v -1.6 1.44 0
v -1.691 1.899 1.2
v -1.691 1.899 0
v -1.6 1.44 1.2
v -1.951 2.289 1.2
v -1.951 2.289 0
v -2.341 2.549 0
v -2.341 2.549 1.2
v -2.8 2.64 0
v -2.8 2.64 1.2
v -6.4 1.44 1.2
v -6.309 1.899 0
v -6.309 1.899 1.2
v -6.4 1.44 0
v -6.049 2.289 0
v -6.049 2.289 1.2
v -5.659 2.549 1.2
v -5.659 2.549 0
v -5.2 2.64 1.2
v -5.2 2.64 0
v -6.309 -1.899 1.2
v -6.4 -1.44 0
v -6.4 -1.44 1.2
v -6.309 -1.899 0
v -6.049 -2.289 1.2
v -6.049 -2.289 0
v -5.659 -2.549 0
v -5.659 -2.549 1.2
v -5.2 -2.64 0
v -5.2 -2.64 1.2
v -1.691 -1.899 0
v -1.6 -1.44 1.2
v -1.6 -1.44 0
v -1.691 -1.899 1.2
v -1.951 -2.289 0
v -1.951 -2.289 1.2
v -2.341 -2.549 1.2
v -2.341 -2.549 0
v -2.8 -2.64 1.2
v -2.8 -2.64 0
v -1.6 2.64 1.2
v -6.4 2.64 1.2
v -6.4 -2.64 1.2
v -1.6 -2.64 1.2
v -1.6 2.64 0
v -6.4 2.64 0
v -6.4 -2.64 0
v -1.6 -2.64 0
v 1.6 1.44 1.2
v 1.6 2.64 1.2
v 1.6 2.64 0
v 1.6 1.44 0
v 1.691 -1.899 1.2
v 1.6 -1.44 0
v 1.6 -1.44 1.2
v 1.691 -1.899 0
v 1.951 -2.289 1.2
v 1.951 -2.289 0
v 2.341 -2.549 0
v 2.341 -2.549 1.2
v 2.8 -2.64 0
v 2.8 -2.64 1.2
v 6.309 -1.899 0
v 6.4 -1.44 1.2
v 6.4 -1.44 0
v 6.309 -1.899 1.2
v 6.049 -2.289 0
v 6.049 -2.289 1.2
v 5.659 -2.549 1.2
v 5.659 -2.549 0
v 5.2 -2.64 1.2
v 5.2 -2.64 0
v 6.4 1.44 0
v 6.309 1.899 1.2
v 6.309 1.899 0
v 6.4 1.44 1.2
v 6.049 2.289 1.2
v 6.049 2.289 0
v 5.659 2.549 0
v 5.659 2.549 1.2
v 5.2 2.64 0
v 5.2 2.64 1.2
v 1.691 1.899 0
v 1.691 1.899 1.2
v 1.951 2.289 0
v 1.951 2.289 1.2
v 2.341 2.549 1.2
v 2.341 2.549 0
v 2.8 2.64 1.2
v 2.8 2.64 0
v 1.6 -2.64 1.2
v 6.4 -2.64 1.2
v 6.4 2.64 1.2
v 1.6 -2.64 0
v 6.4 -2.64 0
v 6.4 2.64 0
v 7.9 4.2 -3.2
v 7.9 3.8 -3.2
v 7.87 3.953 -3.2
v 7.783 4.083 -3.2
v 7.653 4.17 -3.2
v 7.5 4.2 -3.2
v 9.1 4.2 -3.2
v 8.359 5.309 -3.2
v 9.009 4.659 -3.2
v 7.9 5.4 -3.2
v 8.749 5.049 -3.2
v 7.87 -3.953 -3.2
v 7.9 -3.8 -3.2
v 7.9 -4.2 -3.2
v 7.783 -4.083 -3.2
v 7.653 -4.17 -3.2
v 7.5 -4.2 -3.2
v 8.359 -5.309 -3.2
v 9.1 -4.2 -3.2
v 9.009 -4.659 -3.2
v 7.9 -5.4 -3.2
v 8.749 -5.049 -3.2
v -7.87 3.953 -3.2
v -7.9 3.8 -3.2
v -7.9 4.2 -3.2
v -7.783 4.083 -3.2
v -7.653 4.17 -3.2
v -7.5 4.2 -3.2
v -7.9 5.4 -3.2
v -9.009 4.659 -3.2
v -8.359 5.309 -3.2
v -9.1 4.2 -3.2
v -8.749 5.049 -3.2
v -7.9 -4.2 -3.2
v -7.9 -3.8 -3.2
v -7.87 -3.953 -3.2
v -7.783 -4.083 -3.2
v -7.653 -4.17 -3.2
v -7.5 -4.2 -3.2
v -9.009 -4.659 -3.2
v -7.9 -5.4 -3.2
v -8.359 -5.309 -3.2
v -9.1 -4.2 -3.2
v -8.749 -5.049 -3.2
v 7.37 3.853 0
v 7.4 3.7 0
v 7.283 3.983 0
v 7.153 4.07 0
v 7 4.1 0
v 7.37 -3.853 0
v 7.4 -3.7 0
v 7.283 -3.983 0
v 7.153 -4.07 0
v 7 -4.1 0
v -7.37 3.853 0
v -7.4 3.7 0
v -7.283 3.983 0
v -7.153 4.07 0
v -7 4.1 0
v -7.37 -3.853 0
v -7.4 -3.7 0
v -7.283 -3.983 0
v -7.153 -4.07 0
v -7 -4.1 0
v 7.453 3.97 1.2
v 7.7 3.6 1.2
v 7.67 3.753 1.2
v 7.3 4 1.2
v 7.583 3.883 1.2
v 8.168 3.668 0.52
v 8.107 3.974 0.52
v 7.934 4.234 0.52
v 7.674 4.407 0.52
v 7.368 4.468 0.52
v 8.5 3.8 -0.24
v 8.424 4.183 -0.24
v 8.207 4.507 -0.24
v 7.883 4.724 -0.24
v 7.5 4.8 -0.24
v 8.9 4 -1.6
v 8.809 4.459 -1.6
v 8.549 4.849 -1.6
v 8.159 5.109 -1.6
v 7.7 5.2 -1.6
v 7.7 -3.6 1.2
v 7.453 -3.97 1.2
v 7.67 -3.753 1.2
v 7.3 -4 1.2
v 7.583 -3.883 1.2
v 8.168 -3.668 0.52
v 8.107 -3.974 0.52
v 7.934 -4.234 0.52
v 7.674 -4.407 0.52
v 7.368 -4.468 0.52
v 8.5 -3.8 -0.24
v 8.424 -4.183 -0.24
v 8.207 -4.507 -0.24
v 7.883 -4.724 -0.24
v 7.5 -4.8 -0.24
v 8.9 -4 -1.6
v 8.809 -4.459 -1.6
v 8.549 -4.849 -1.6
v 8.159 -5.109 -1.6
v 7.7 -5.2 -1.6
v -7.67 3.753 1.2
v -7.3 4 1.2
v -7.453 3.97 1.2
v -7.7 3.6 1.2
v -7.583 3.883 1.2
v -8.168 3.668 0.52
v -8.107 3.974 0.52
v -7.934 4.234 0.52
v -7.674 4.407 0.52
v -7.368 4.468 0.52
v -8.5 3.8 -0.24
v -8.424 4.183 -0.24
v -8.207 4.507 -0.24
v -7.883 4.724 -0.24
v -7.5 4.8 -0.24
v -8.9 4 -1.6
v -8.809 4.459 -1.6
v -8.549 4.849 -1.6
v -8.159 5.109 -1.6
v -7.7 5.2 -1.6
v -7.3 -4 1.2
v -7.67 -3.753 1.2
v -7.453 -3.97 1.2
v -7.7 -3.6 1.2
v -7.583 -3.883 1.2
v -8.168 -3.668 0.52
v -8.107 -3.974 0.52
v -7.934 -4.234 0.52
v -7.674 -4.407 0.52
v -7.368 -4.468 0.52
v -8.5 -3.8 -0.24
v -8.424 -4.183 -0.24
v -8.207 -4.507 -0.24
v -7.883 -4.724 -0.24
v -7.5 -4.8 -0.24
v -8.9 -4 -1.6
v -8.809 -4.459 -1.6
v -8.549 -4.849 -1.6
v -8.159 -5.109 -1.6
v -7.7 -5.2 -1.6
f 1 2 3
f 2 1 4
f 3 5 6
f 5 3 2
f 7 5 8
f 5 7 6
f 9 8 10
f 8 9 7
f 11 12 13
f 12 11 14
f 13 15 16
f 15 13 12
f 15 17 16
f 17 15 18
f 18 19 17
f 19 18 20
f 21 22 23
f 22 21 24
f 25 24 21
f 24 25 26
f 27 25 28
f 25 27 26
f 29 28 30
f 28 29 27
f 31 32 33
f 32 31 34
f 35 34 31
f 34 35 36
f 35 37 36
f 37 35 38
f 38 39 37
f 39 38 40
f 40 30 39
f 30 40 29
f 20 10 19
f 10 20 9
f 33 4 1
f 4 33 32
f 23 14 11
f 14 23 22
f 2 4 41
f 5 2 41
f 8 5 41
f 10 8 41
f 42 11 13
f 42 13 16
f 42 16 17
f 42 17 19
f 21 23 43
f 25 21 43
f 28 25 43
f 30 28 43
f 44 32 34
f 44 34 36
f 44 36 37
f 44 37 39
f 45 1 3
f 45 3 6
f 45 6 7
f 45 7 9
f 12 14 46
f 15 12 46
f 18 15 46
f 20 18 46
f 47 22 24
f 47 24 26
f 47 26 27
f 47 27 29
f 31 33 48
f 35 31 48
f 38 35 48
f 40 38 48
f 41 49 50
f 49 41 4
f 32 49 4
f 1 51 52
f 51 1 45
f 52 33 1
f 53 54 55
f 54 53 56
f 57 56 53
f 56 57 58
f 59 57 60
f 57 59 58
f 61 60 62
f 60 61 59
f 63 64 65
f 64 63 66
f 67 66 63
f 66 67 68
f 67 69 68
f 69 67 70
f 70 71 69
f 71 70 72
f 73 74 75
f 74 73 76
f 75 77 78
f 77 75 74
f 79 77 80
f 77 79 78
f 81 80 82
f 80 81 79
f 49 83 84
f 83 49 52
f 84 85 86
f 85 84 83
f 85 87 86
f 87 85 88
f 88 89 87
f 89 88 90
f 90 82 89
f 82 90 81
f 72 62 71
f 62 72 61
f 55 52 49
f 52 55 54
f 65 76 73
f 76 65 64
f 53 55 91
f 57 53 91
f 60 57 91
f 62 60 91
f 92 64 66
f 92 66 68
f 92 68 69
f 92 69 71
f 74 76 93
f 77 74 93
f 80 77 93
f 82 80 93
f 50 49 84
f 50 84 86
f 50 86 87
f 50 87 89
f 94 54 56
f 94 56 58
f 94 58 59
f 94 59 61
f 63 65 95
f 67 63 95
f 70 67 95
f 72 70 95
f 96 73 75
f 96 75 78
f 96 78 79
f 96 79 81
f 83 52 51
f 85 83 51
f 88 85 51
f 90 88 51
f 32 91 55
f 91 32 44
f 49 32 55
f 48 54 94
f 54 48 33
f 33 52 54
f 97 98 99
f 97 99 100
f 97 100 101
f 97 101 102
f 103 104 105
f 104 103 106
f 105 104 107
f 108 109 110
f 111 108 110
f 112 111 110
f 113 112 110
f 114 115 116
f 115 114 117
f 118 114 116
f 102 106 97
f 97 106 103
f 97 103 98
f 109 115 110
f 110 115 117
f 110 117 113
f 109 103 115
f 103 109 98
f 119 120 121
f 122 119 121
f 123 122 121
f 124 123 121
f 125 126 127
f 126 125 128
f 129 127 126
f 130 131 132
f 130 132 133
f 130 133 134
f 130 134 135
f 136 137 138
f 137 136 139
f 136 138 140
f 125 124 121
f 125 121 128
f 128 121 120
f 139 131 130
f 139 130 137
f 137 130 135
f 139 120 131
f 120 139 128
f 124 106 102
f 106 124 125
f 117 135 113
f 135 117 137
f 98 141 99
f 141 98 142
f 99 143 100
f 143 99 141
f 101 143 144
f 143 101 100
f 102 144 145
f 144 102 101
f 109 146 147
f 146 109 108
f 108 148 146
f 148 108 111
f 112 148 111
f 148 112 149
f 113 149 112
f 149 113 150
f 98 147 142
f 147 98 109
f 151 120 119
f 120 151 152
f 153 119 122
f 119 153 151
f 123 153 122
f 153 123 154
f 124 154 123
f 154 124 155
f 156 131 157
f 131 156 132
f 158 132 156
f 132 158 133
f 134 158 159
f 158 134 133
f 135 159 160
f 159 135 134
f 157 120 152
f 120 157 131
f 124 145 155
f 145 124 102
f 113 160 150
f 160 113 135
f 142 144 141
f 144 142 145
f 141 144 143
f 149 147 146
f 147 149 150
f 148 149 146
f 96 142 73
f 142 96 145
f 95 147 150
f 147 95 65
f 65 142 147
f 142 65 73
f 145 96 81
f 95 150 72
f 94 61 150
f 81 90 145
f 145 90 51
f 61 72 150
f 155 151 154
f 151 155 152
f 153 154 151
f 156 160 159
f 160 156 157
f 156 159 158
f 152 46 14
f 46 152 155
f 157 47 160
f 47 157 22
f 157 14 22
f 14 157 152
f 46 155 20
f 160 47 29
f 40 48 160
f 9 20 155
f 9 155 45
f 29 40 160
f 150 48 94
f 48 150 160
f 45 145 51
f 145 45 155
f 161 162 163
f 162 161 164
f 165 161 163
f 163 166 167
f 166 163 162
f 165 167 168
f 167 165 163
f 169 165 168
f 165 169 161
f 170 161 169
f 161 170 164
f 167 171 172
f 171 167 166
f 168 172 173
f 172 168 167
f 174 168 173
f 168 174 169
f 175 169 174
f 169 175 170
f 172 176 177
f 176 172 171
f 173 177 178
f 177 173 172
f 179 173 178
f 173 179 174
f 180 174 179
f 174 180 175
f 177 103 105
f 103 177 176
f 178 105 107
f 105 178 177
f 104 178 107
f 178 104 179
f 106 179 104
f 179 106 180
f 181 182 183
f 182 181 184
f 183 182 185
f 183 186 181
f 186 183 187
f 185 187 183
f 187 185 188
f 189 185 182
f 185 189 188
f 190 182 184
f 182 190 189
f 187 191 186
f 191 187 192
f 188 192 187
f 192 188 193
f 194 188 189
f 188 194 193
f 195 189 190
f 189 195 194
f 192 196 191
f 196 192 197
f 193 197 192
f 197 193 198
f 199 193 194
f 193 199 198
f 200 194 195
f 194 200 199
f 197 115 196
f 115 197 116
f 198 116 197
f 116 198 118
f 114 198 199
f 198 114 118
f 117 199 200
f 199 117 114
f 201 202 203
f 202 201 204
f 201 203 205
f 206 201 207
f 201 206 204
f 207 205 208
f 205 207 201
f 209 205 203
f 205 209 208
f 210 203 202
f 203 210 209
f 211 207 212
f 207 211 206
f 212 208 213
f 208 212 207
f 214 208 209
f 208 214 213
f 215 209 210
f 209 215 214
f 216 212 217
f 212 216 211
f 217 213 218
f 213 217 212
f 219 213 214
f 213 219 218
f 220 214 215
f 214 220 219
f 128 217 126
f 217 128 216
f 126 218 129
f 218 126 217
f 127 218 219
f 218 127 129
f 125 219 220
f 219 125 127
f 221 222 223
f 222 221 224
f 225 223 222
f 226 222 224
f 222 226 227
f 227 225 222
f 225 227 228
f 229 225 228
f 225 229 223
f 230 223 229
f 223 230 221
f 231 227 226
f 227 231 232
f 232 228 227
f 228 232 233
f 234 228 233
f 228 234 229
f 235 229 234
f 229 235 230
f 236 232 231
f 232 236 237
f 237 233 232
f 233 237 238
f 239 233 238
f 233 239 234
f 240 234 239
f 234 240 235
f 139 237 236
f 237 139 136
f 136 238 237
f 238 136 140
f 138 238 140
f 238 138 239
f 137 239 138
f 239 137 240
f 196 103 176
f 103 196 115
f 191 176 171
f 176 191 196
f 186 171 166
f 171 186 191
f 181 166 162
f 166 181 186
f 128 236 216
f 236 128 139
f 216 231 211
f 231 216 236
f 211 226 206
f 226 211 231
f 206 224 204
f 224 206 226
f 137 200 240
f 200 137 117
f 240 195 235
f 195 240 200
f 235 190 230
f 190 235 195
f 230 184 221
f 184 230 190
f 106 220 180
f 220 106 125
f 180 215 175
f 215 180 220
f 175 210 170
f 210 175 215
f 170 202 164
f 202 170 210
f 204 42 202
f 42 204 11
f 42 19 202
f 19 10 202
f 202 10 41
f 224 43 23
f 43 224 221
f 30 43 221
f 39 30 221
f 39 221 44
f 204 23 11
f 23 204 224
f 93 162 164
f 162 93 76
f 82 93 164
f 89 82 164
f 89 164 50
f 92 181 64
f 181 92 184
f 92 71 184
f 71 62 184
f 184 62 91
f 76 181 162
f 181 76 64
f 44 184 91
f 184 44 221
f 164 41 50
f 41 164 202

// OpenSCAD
use <../lib.scad>
use <../p/1-4chrd.scad>
use <../p/1-4con1.scad>
use <../p/1-4con4.scad>
use <../p/1-4con5.scad>
use <../p/1-4cyli.scad>
use <../p/1-4cylo.scad>
use <../p/1-4edge.scad>
use <../p/1-4ndis.scad>
use <s/24779s03.scad>
$fa=1; $fs=0.2;
function ldraw_lib__65753(realsolid=false) = [
// 0 Minifig Skirt Straight Curved  0.55 Length
// 0 Name: 65753.dat
// 0 Author: Gerald Lasser [GeraldLasser]
// 0 !LDRAW_ORG Part UPDATE 2022-03
// 0 !LICENSE Licensed under CC BY 2.0 and CC BY 4.0 : see CAreadme.txt
// 
// 0 BFC CERTIFY CCW
  [0,"BFC","CERTIFY"],
  [0,"BFC","CCW"],
// 
// 0 !CATEGORY Minifig Hipwear
// 
// 0 !HISTORY 2022-05-07 [PTadmin] Official Update 2022-03
// 
// 
// 1 16 0 0 0 1 0 0 0 1 0 0 0 1 s\24779s03.dat
  [1,16,0,0,0,1,0,0,0,1,0,0,0,1, ldraw_lib__s__24779s03(realsolid)],
// 1 16 0 0 0 -1 0 0 0 1 0 0 0 -1 s\24779s03.dat
  [1,16,0,0,0,-1,0,0,0,1,0,0,0,-1, ldraw_lib__s__24779s03(realsolid)],
// 
// 0 // Bottom
// 1 16 18.75 8 9.5 1 0 0 0 -1 0 0 0 1 1-4ndis.dat
  [1,16,18.75,8,9.5,1,0,0,0,-1,0,0,0,1, ldraw_lib__1_4ndis(realsolid)],
// 1 16 19.75 8 10.5 3 0 0 0 -1 0 0 0 3 1-4chrd.dat
  [1,16,19.75,8,10.5,3,0,0,0,-1,0,0,0,3, ldraw_lib__1_4chrd(realsolid)],
// 1 16 18.75 8 -9.5 1 0 0 0 -1 0 0 0 -1 1-4ndis.dat
  [1,16,18.75,8,-9.5,1,0,0,0,-1,0,0,0,-1, ldraw_lib__1_4ndis(realsolid)],
// 1 16 19.75 8 -10.5 3 0 0 0 -1 0 0 0 -3 1-4chrd.dat
  [1,16,19.75,8,-10.5,3,0,0,0,-1,0,0,0,-3, ldraw_lib__1_4chrd(realsolid)],
// 3 16 18.75 8 10.5 19.75 8 13.5 19.75 8 10.5
  [3,16,18.75,8,10.5,19.75,8,13.5,19.75,8,10.5],
// 3 16 19.75 8 10.5 19.75 8 13.5 22.75 8 10.5
  [3,16,19.75,8,10.5,19.75,8,13.5,22.75,8,10.5],
// 3 16 19.75 8 10.5 22.75 8 10.5 19.75 8 9.5
  [3,16,19.75,8,10.5,22.75,8,10.5,19.75,8,9.5],
// 3 16 19.75 8 -9.5 22.75 8 -10.5 19.75 8 -10.5
  [3,16,19.75,8,-9.5,22.75,8,-10.5,19.75,8,-10.5],
// 3 16 19.75 8 -10.5 22.75 8 -10.5 19.75 8 -13.5
  [3,16,19.75,8,-10.5,22.75,8,-10.5,19.75,8,-13.5],
// 3 16 19.75 8 -10.5 19.75 8 -13.5 18.75 8 -10.5
  [3,16,19.75,8,-10.5,19.75,8,-13.5,18.75,8,-10.5],
// 4 16 22.75 8 -10.5 19.75 8 -9.5 19.75 8 9.5 22.75 8 10.5
  [4,16,22.75,8,-10.5,19.75,8,-9.5,19.75,8,9.5,22.75,8,10.5],
// 1 16 19.75 8 10.5 3 0 0 0 -1 0 0 0 3 1-4edge.dat
  [1,16,19.75,8,10.5,3,0,0,0,-1,0,0,0,3, ldraw_lib__1_4edge(realsolid)],
// 1 16 19.75 8 -10.5 3 0 0 0 -1 0 0 0 -3 1-4edge.dat
  [1,16,19.75,8,-10.5,3,0,0,0,-1,0,0,0,-3, ldraw_lib__1_4edge(realsolid)],
// 2 24 19.75 8 9.5 19.75 8 -9.5
  [2,24,19.75,8,9.5,19.75,8,-9.5],
// 2 24 22.75 8 10.5 22.75 8 -10.5
  [2,24,22.75,8,10.5,22.75,8,-10.5],
// 1 16 -18.75 8 9.5 -1 0 0 0 -1 0 0 0 1 1-4ndis.dat
  [1,16,-18.75,8,9.5,-1,0,0,0,-1,0,0,0,1, ldraw_lib__1_4ndis(realsolid)],
// 1 16 -19.75 8 10.5 -3 0 0 0 -1 0 0 0 3 1-4chrd.dat
  [1,16,-19.75,8,10.5,-3,0,0,0,-1,0,0,0,3, ldraw_lib__1_4chrd(realsolid)],
// 1 16 -18.75 8 -9.5 -1 0 0 0 -1 0 0 0 -1 1-4ndis.dat
  [1,16,-18.75,8,-9.5,-1,0,0,0,-1,0,0,0,-1, ldraw_lib__1_4ndis(realsolid)],
// 1 16 -19.75 8 -10.5 -3 0 0 0 -1 0 0 0 -3 1-4chrd.dat
  [1,16,-19.75,8,-10.5,-3,0,0,0,-1,0,0,0,-3, ldraw_lib__1_4chrd(realsolid)],
// 3 16 -19.75 8 13.5 -18.75 8 10.5 -19.75 8 10.5
  [3,16,-19.75,8,13.5,-18.75,8,10.5,-19.75,8,10.5],
// 3 16 -19.75 8 13.5 -19.75 8 10.5 -22.75 8 10.5
  [3,16,-19.75,8,13.5,-19.75,8,10.5,-22.75,8,10.5],
// 3 16 -22.75 8 10.5 -19.75 8 10.5 -19.75 8 9.5
  [3,16,-22.75,8,10.5,-19.75,8,10.5,-19.75,8,9.5],
// 3 16 -22.75 8 -10.5 -19.75 8 -9.5 -19.75 8 -10.5
  [3,16,-22.75,8,-10.5,-19.75,8,-9.5,-19.75,8,-10.5],
// 3 16 -22.75 8 -10.5 -19.75 8 -10.5 -19.75 8 -13.5
  [3,16,-22.75,8,-10.5,-19.75,8,-10.5,-19.75,8,-13.5],
// 3 16 -19.75 8 -13.5 -19.75 8 -10.5 -18.75 8 -10.5
  [3,16,-19.75,8,-13.5,-19.75,8,-10.5,-18.75,8,-10.5],
// 4 16 -19.75 8 9.5 -19.75 8 -9.5 -22.75 8 -10.5 -22.75 8 10.5
  [4,16,-19.75,8,9.5,-19.75,8,-9.5,-22.75,8,-10.5,-22.75,8,10.5],
// 1 16 -19.75 8 10.5 -3 0 0 0 -1 0 0 0 3 1-4edge.dat
  [1,16,-19.75,8,10.5,-3,0,0,0,-1,0,0,0,3, ldraw_lib__1_4edge(realsolid)],
// 1 16 -19.75 8 -10.5 -3 0 0 0 -1 0 0 0 -3 1-4edge.dat
  [1,16,-19.75,8,-10.5,-3,0,0,0,-1,0,0,0,-3, ldraw_lib__1_4edge(realsolid)],
// 2 24 -19.75 8 9.5 -19.75 8 -9.5
  [2,24,-19.75,8,9.5,-19.75,8,-9.5],
// 2 24 -22.75 8 10.5 -22.75 8 -10.5
  [2,24,-22.75,8,10.5,-22.75,8,-10.5],
// 
// 4 16 19.75 8 13.5 18.75 8 10.5 -18.75 8 10.5 -19.75 8 13.5
  [4,16,19.75,8,13.5,18.75,8,10.5,-18.75,8,10.5,-19.75,8,13.5],
// 4 16 -18.75 8 -10.5 18.75 8 -10.5 19.75 8 -13.5 -19.75 8 -13.5
  [4,16,-18.75,8,-10.5,18.75,8,-10.5,19.75,8,-13.5,-19.75,8,-13.5],
// 2 24 19.75 8 13.5 -19.75 8 13.5
  [2,24,19.75,8,13.5,-19.75,8,13.5],
// 2 24 -18.75 8 10.5 18.75 8 10.5
  [2,24,-18.75,8,10.5,18.75,8,10.5],
// 2 24 18.75 8 -10.5 -18.75 8 -10.5
  [2,24,18.75,8,-10.5,-18.75,8,-10.5],
// 2 24 -19.75 8 -13.5 19.75 8 -13.5
  [2,24,-19.75,8,-13.5,19.75,8,-13.5],
// 
// 0 // Inside Skirt
// 0 BFC INVERTNEXT
  [0,"BFC","INVERTNEXT"],
// 1 16 17.5 0 9.25 1 1.25 0 0 8 0 0 .25 1 1-4cylo.dat
  [1,16,17.5,0,9.25,1,1.25,0,0,8,0,0,.25,1, ldraw_lib__1_4cylo(realsolid)],
// 0 BFC INVERTNEXT
  [0,"BFC","INVERTNEXT"],
// 1 16 17.5 0 -9.25 1 1.25 0 0 8 0 0 -.25 -1 1-4cylo.dat
  [1,16,17.5,0,-9.25,1,1.25,0,0,8,0,0,-.25,-1, ldraw_lib__1_4cylo(realsolid)],
// 4 16 19.75 8 9.5 19.75 8 -9.5 18.5 0 -9.25 18.5 0 9.25
  [4,16,19.75,8,9.5,19.75,8,-9.5,18.5,0,-9.25,18.5,0,9.25],
// 0 BFC INVERTNEXT
  [0,"BFC","INVERTNEXT"],
// 1 16 -17.5 0 9.25 -1 -1.25 0 0 8 0 0 .25 1 1-4cylo.dat
  [1,16,-17.5,0,9.25,-1,-1.25,0,0,8,0,0,.25,1, ldraw_lib__1_4cylo(realsolid)],
// 0 BFC INVERTNEXT
  [0,"BFC","INVERTNEXT"],
// 1 16 -17.5 0 -9.25 -1 -1.25 0 0 8 0 0 -.25 -1 1-4cylo.dat
  [1,16,-17.5,0,-9.25,-1,-1.25,0,0,8,0,0,-.25,-1, ldraw_lib__1_4cylo(realsolid)],
// 4 16 -18.5 0 -9.25 -19.75 8 -9.5 -19.75 8 9.5 -18.5 0 9.25
  [4,16,-18.5,0,-9.25,-19.75,8,-9.5,-19.75,8,9.5,-18.5,0,9.25],
// 4 16 -18.75 8 10.5 18.75 8 10.5 17.5 0 10.25 -17.5 0 10.25
  [4,16,-18.75,8,10.5,18.75,8,10.5,17.5,0,10.25,-17.5,0,10.25],
// 4 16 18.75 8 -10.5 -18.75 8 -10.5 -17.5 0 -10.25 17.5 0 -10.25
  [4,16,18.75,8,-10.5,-18.75,8,-10.5,-17.5,0,-10.25,17.5,0,-10.25],
// 
// 0 // Inside Top
// 1 16 17.5 0 9.25 1 0 0 0 -1 0 0 0 1 1-4chrd.dat
  [1,16,17.5,0,9.25,1,0,0,0,-1,0,0,0,1, ldraw_lib__1_4chrd(realsolid)],
// 1 16 17.5 0 -9.25 1 0 0 0 -1 0 0 0 -1 1-4chrd.dat
  [1,16,17.5,0,-9.25,1,0,0,0,-1,0,0,0,-1, ldraw_lib__1_4chrd(realsolid)],
// 4 16 16 0 6.6 17.5 0 10.25 18.5 0 9.25 16 0 3.6
  [4,16,16,0,6.6,17.5,0,10.25,18.5,0,9.25,16,0,3.6],
// 4 16 18.5 0 -9.25 17.5 0 -10.25 16 0 -6.6 16 0 -3.6
  [4,16,18.5,0,-9.25,17.5,0,-10.25,16,0,-6.6,16,0,-3.6],
// 4 16 18.5 0 -9.25 16 0 -3.6 16 0 3.6 18.5 0 9.25
  [4,16,18.5,0,-9.25,16,0,-3.6,16,0,3.6,18.5,0,9.25],
// 3 16 17.5 0 10.25 16 0 6.6 13 0 6.6
  [3,16,17.5,0,10.25,16,0,6.6,13,0,6.6],
// 3 16 16 0 -6.6 17.5 0 -10.25 13 0 -6.6
  [3,16,16,0,-6.6,17.5,0,-10.25,13,0,-6.6],
// 3 16 4 0 -6.6 7 0 -6.6 17.5 0 -10.25
  [3,16,4,0,-6.6,7,0,-6.6,17.5,0,-10.25],
// 3 16 13 0 6.6 7 0 6.6 17.5 0 10.25
  [3,16,13,0,6.6,7,0,6.6,17.5,0,10.25],
// 3 16 17.5 0 10.25 7 0 6.6 4 0 6.6
  [3,16,17.5,0,10.25,7,0,6.6,4,0,6.6],
// 3 16 7 0 -6.6 13 0 -6.6 17.5 0 -10.25
  [3,16,7,0,-6.6,13,0,-6.6,17.5,0,-10.25],
// 
// 1 16 -17.5 0 9.25 -1 0 0 0 -1 0 0 0 1 1-4chrd.dat
  [1,16,-17.5,0,9.25,-1,0,0,0,-1,0,0,0,1, ldraw_lib__1_4chrd(realsolid)],
// 1 16 -17.5 0 -9.25 -1 0 0 0 -1 0 0 0 -1 1-4chrd.dat
  [1,16,-17.5,0,-9.25,-1,0,0,0,-1,0,0,0,-1, ldraw_lib__1_4chrd(realsolid)],
// 4 16 -18.5 0 9.25 -17.5 0 10.25 -16 0 6.6 -16 0 3.6
  [4,16,-18.5,0,9.25,-17.5,0,10.25,-16,0,6.6,-16,0,3.6],
// 4 16 -16 0 -6.6 -17.5 0 -10.25 -18.5 0 -9.25 -16 0 -3.6
  [4,16,-16,0,-6.6,-17.5,0,-10.25,-18.5,0,-9.25,-16,0,-3.6],
// 4 16 -16 0 3.6 -16 0 -3.6 -18.5 0 -9.25 -18.5 0 9.25
  [4,16,-16,0,3.6,-16,0,-3.6,-18.5,0,-9.25,-18.5,0,9.25],
// 3 16 -16 0 6.6 -17.5 0 10.25 -13 0 6.6
  [3,16,-16,0,6.6,-17.5,0,10.25,-13,0,6.6],
// 3 16 -17.5 0 -10.25 -16 0 -6.6 -13 0 -6.6
  [3,16,-17.5,0,-10.25,-16,0,-6.6,-13,0,-6.6],
// 3 16 -7 0 -6.6 -4 0 -6.6 -17.5 0 -10.25
  [3,16,-7,0,-6.6,-4,0,-6.6,-17.5,0,-10.25],
// 3 16 -7 0 6.6 -13 0 6.6 -17.5 0 10.25
  [3,16,-7,0,6.6,-13,0,6.6,-17.5,0,10.25],
// 3 16 -7 0 6.6 -17.5 0 10.25 -4 0 6.6
  [3,16,-7,0,6.6,-17.5,0,10.25,-4,0,6.6],
// 3 16 -13 0 -6.6 -7 0 -6.6 -17.5 0 -10.25
  [3,16,-13,0,-6.6,-7,0,-6.6,-17.5,0,-10.25],
// 
// 4 16 -17.5 0 -10.25 -4 0 -6.6 4 0 -6.6 17.5 0 -10.25
  [4,16,-17.5,0,-10.25,-4,0,-6.6,4,0,-6.6,17.5,0,-10.25],
// 4 16 17.5 0 10.25 4 0 6.6 -4 0 6.6 -17.5 0 10.25
  [4,16,17.5,0,10.25,4,0,6.6,-4,0,6.6,-17.5,0,10.25],
// 2 24 -18.5 0 -9.25 -18.5 0 9.25
  [2,24,-18.5,0,-9.25,-18.5,0,9.25],
// 2 24 -17.5 0 10.25 17.5 0 10.25
  [2,24,-17.5,0,10.25,17.5,0,10.25],
// 2 24 18.5 0 9.25 18.5 0 -9.25
  [2,24,18.5,0,9.25,18.5,0,-9.25],
// 2 24 17.5 0 -10.25 -17.5 0 -10.25
  [2,24,17.5,0,-10.25,-17.5,0,-10.25],
// 
// 0 // Top
// 1 16 18.25 -3 9 1 0 0 0 1 0 0 0 1 1-4edge.dat
  [1,16,18.25,-3,9,1,0,0,0,1,0,0,0,1, ldraw_lib__1_4edge(realsolid)],
// 1 16 18.25 -3 9 1 0 0 0 1 0 0 0 1 1-4chrd.dat
  [1,16,18.25,-3,9,1,0,0,0,1,0,0,0,1, ldraw_lib__1_4chrd(realsolid)],
// 1 16 18.42 -1.3 9.17 1 -.17 0 0 -1.7 0 0 -.17 1 1-4con1.dat
  [1,16,18.42,-1.3,9.17,1,-.17,0,0,-1.7,0,0,-.17,1, ldraw_lib__1_4con1(realsolid)],
// 1 16 18.75 .6 9.5 .5 -.33 0 0 -1.9 0 0 -.33 .5 1-4con4.dat
  [1,16,18.75,.6,9.5,.5,-.33,0,0,-1.9,0,0,-.33,.5, ldraw_lib__1_4con4(realsolid)],
// 1 16 19.25 4 10 .5 -.5 0 0 -3.4 0 0 -.5 .5 1-4con5.dat
  [1,16,19.25,4,10,.5,-.5,0,0,-3.4,0,0,-.5,.5, ldraw_lib__1_4con5(realsolid)],
// 1 16 19.75 8 10.5 3 -.5 0 0 -4 0 0 -.5 3 1-4cyli.dat
  [1,16,19.75,8,10.5,3,-.5,0,0,-4,0,0,-.5,3, ldraw_lib__1_4cyli(realsolid)],
// 
// 1 16 18.25 -3 -9 1 0 0 0 1 0 0 0 -1 1-4edge.dat
  [1,16,18.25,-3,-9,1,0,0,0,1,0,0,0,-1, ldraw_lib__1_4edge(realsolid)],
// 1 16 18.25 -3 -9 1 0 0 0 1 0 0 0 -1 1-4chrd.dat
  [1,16,18.25,-3,-9,1,0,0,0,1,0,0,0,-1, ldraw_lib__1_4chrd(realsolid)],
// 1 16 18.42 -1.3 -9.17 1 -.17 0 0 -1.7 0 0 .17 -1 1-4con1.dat
  [1,16,18.42,-1.3,-9.17,1,-.17,0,0,-1.7,0,0,.17,-1, ldraw_lib__1_4con1(realsolid)],
// 1 16 18.75 .6 -9.5 .5 -.33 0 0 -1.9 0 0 .33 -.5 1-4con4.dat
  [1,16,18.75,.6,-9.5,.5,-.33,0,0,-1.9,0,0,.33,-.5, ldraw_lib__1_4con4(realsolid)],
// 1 16 19.25 4 -10 .5 -.5 0 0 -3.4 0 0 .5 -.5 1-4con5.dat
  [1,16,19.25,4,-10,.5,-.5,0,0,-3.4,0,0,.5,-.5, ldraw_lib__1_4con5(realsolid)],
// 1 16 19.75 8 -10.5 3 -.5 0 0 -4 0 0 .5 -3 1-4cyli.dat
  [1,16,19.75,8,-10.5,3,-.5,0,0,-4,0,0,.5,-3, ldraw_lib__1_4cyli(realsolid)],
// 
// 1 16 -18.25 -3 9 -1 0 0 0 1 0 0 0 1 1-4edge.dat
  [1,16,-18.25,-3,9,-1,0,0,0,1,0,0,0,1, ldraw_lib__1_4edge(realsolid)],
// 1 16 -18.25 -3 9 -1 0 0 0 1 0 0 0 1 1-4chrd.dat
  [1,16,-18.25,-3,9,-1,0,0,0,1,0,0,0,1, ldraw_lib__1_4chrd(realsolid)],
// 1 16 -18.42 -1.3 9.17 -1 .17 0 0 -1.7 0 0 -.17 1 1-4con1.dat
  [1,16,-18.42,-1.3,9.17,-1,.17,0,0,-1.7,0,0,-.17,1, ldraw_lib__1_4con1(realsolid)],
// 1 16 -18.75 .6 9.5 -.5 .33 0 0 -1.9 0 0 -.33 .5 1-4con4.dat
  [1,16,-18.75,.6,9.5,-.5,.33,0,0,-1.9,0,0,-.33,.5, ldraw_lib__1_4con4(realsolid)],
// 1 16 -19.25 4 10 -.5 .5 0 0 -3.4 0 0 -.5 .5 1-4con5.dat
  [1,16,-19.25,4,10,-.5,.5,0,0,-3.4,0,0,-.5,.5, ldraw_lib__1_4con5(realsolid)],
// 1 16 -19.75 8 10.5 -3 .5 0 0 -4 0 0 -.5 3 1-4cyli.dat
  [1,16,-19.75,8,10.5,-3,.5,0,0,-4,0,0,-.5,3, ldraw_lib__1_4cyli(realsolid)],
// 
// 1 16 -18.25 -3 -9 -1 0 0 0 1 0 0 0 -1 1-4edge.dat
  [1,16,-18.25,-3,-9,-1,0,0,0,1,0,0,0,-1, ldraw_lib__1_4edge(realsolid)],
// 1 16 -18.25 -3 -9 -1 0 0 0 1 0 0 0 -1 1-4chrd.dat
  [1,16,-18.25,-3,-9,-1,0,0,0,1,0,0,0,-1, ldraw_lib__1_4chrd(realsolid)],
// 1 16 -18.42 -1.3 -9.17 -1 .17 0 0 -1.7 0 0 .17 -1 1-4con1.dat
  [1,16,-18.42,-1.3,-9.17,-1,.17,0,0,-1.7,0,0,.17,-1, ldraw_lib__1_4con1(realsolid)],
// 1 16 -18.75 .6 -9.5 -.5 .33 0 0 -1.9 0 0 .33 -.5 1-4con4.dat
  [1,16,-18.75,.6,-9.5,-.5,.33,0,0,-1.9,0,0,.33,-.5, ldraw_lib__1_4con4(realsolid)],
// 1 16 -19.25 4 -10 -.5 .5 0 0 -3.4 0 0 .5 -.5 1-4con5.dat
  [1,16,-19.25,4,-10,-.5,.5,0,0,-3.4,0,0,.5,-.5, ldraw_lib__1_4con5(realsolid)],
// 1 16 -19.75 8 -10.5 -3 .5 0 0 -4 0 0 .5 -3 1-4cyli.dat
  [1,16,-19.75,8,-10.5,-3,.5,0,0,-4,0,0,.5,-3, ldraw_lib__1_4cyli(realsolid)],
// 
// 4 16 22.25 4 10 22.25 4 -10 22.75 8 -10.5 22.75 8 10.5
  [4,16,22.25,4,10,22.25,4,-10,22.75,8,-10.5,22.75,8,10.5],
// 4 16 22.25 4 -10 22.25 4 10 21.25 .6 9.5 21.25 .6 -9.5
  [4,16,22.25,4,-10,22.25,4,10,21.25,.6,9.5,21.25,.6,-9.5],
// 4 16 20.42 -1.3 -9.17 21.25 .6 -9.5 21.25 .6 9.5 20.42 -1.3 9.17
  [4,16,20.42,-1.3,-9.17,21.25,.6,-9.5,21.25,.6,9.5,20.42,-1.3,9.17],
// 4 16 20.42 -1.3 -9.17 20.42 -1.3 9.17 19.25 -3 9 19.25 -3 -9
  [4,16,20.42,-1.3,-9.17,20.42,-1.3,9.17,19.25,-3,9,19.25,-3,-9],
// 4 16 -22.75 8 -10.5 -22.25 4 -10 -22.25 4 10 -22.75 8 10.5
  [4,16,-22.75,8,-10.5,-22.25,4,-10,-22.25,4,10,-22.75,8,10.5],
// 4 16 -21.25 .6 9.5 -22.25 4 10 -22.25 4 -10 -21.25 .6 -9.5
  [4,16,-21.25,.6,9.5,-22.25,4,10,-22.25,4,-10,-21.25,.6,-9.5],
// 4 16 -21.25 .6 9.5 -21.25 .6 -9.5 -20.42 -1.3 -9.17 -20.42 -1.3 9.17
  [4,16,-21.25,.6,9.5,-21.25,.6,-9.5,-20.42,-1.3,-9.17,-20.42,-1.3,9.17],
// 4 16 -19.25 -3 9 -20.42 -1.3 9.17 -20.42 -1.3 -9.17 -19.25 -3 -9
  [4,16,-19.25,-3,9,-20.42,-1.3,9.17,-20.42,-1.3,-9.17,-19.25,-3,-9],
// 4 16 -19.75 8 -13.5 19.75 8 -13.5 19.25 4 -13 -19.25 4 -13
  [4,16,-19.75,8,-13.5,19.75,8,-13.5,19.25,4,-13,-19.25,4,-13],
// 4 16 -18.75 .6 -12 -19.25 4 -13 19.25 4 -13 18.75 .6 -12
  [4,16,-18.75,.6,-12,-19.25,4,-13,19.25,4,-13,18.75,.6,-12],
// 4 16 -18.75 .6 -12 18.75 .6 -12 18.42 -1.3 -11.17 -18.42 -1.3 -11.17
  [4,16,-18.75,.6,-12,18.75,.6,-12,18.42,-1.3,-11.17,-18.42,-1.3,-11.17],
// 4 16 18.25 -3 -10 -18.25 -3 -10 -18.42 -1.3 -11.17 18.42 -1.3 -11.17
  [4,16,18.25,-3,-10,-18.25,-3,-10,-18.42,-1.3,-11.17,18.42,-1.3,-11.17],
// 4 16 19.25 4 13 19.75 8 13.5 -19.75 8 13.5 -19.25 4 13
  [4,16,19.25,4,13,19.75,8,13.5,-19.75,8,13.5,-19.25,4,13],
// 4 16 19.25 4 13 -19.25 4 13 -18.75 .6 12 18.75 .6 12
  [4,16,19.25,4,13,-19.25,4,13,-18.75,.6,12,18.75,.6,12],
// 4 16 18.42 -1.3 11.17 18.75 .6 12 -18.75 .6 12 -18.42 -1.3 11.17
  [4,16,18.42,-1.3,11.17,18.75,.6,12,-18.75,.6,12,-18.42,-1.3,11.17],
// 4 16 -18.42 -1.3 11.17 -18.25 -3 10 18.25 -3 10 18.42 -1.3 11.17
  [4,16,-18.42,-1.3,11.17,-18.25,-3,10,18.25,-3,10,18.42,-1.3,11.17],
// 
// 5 24 22.25 4 -10 22.25 4 10 22.75 8 10.5 21.25 .6 9.5
  [5,24,22.25,4,-10,22.25,4,10,22.75,8,10.5,21.25,.6,9.5],
// 5 24 21.25 .6 9.5 21.25 .6 -9.5 20.42 -1.3 -9.17 22.25 4 -10
  [5,24,21.25,.6,9.5,21.25,.6,-9.5,20.42,-1.3,-9.17,22.25,4,-10],
// 5 24 20.42 -1.3 9.17 20.42 -1.3 -9.17 19.25 -3 -9 21.25 .6 -9.5
  [5,24,20.42,-1.3,9.17,20.42,-1.3,-9.17,19.25,-3,-9,21.25,.6,-9.5],
// 5 24 -22.25 4 -10 -22.25 4 10 -22.75 8 10.5 -21.25 .6 9.5
  [5,24,-22.25,4,-10,-22.25,4,10,-22.75,8,10.5,-21.25,.6,9.5],
// 5 24 -21.25 .6 9.5 -21.25 .6 -9.5 -20.42 -1.3 -9.17 -22.25 4 -10
  [5,24,-21.25,.6,9.5,-21.25,.6,-9.5,-20.42,-1.3,-9.17,-22.25,4,-10],
// 5 24 -20.42 -1.3 9.17 -20.42 -1.3 -9.17 -19.25 -3 -9 -21.25 .6 -9.5
  [5,24,-20.42,-1.3,9.17,-20.42,-1.3,-9.17,-19.25,-3,-9,-21.25,.6,-9.5],
// 5 24 -19.25 4 -13 19.25 4 -13 19.75 8 -13.5 18.75 .6 -12
  [5,24,-19.25,4,-13,19.25,4,-13,19.75,8,-13.5,18.75,.6,-12],
// 5 24 -18.75 .6 -12 18.75 .6 -12 19.25 4 -13 18.42 -1.3 -11.17
  [5,24,-18.75,.6,-12,18.75,.6,-12,19.25,4,-13,18.42,-1.3,-11.17],
// 5 24 -18.42 -1.3 -11.17 18.42 -1.3 -11.17 18.75 .6 -12 18.25 -3 -10
  [5,24,-18.42,-1.3,-11.17,18.42,-1.3,-11.17,18.75,.6,-12,18.25,-3,-10],
// 5 24 -19.25 4 13 19.25 4 13 19.75 8 13.5 18.75 .6 12
  [5,24,-19.25,4,13,19.25,4,13,19.75,8,13.5,18.75,.6,12],
// 5 24 -18.75 .6 12 18.75 .6 12 19.25 4 13 18.42 -1.3 11.17
  [5,24,-18.75,.6,12,18.75,.6,12,19.25,4,13,18.42,-1.3,11.17],
// 5 24 -18.42 -1.3 11.17 18.42 -1.3 11.17 18.75 .6 12 18.25 -3 10
  [5,24,-18.42,-1.3,11.17,18.42,-1.3,11.17,18.75,.6,12,18.25,-3,10],
// 
// 5 24 -22.0217 4 -11.1481 -22.25 4 -10 -22.75 8 -10.5 -21.25 .6 -9.5
  [5,24,-22.0217,4,-11.1481,-22.25,4,-10,-22.75,8,-10.5,-21.25,.6,-9.5],
// 5 24 -21.3713 4 -12.1213 -22.0217 4 -11.1481 -22.5217 8 -11.6481 -21.05975 .6 -10.45675
  [5,24,-21.3713,4,-12.1213,-22.0217,4,-11.1481,-22.5217,8,-11.6481,-21.05975,.6,-10.45675],
// 5 24 -21.3713 4 -12.1213 -20.3981 4 -12.7717 -21.8713 8 -12.6213 -20.51775 .6 -11.26775
  [5,24,-21.3713,4,-12.1213,-20.3981,4,-12.7717,-21.8713,8,-12.6213,-20.51775,.6,-11.26775],
// 5 24 -20.3981 4 -12.7717 -19.25 4 -13 -19.75 8 -13.5 -18.75 .6 -12
  [5,24,-20.3981,4,-12.7717,-19.25,4,-13,-19.75,8,-13.5,-18.75,.6,-12],
// 5 24 -19.70675 .6 -11.80975 -18.75 .6 -12 -19.25 4 -13 -18.42 -1.3 -11.17
  [5,24,-19.70675,.6,-11.80975,-18.75,.6,-12,-19.25,4,-13,-18.42,-1.3,-11.17],
// 5 24 -20.51775 .6 -11.26775 -19.70675 .6 -11.80975 -20.3981 4 -12.7717 -19.1854 -1.3 -11.0178
  [5,24,-20.51775,.6,-11.26775,-19.70675,.6,-11.80975,-20.3981,4,-12.7717,-19.1854,-1.3,-11.0178],
// 5 24 -20.51775 .6 -11.26775 -21.05975 .6 -10.45675 -22.0217 4 -11.1481 -20.2678 -1.3 -9.9354
  [5,24,-20.51775,.6,-11.26775,-21.05975,.6,-10.45675,-22.0217,4,-11.1481,-20.2678,-1.3,-9.9354],
// 5 24 -21.05975 .6 -10.45675 -21.25 .6 -9.5 -22.25 4 -10 -20.42 -1.3 -9.17
  [5,24,-21.05975,.6,-10.45675,-21.25,.6,-9.5,-22.25,4,-10,-20.42,-1.3,-9.17],
// 5 24 -20.2678 -1.3 -9.9354 -20.42 -1.3 -9.17 -21.25 .6 -9.5 -19.25 -3 -9
  [5,24,-20.2678,-1.3,-9.9354,-20.42,-1.3,-9.17,-21.25,.6,-9.5,-19.25,-3,-9],
// 5 24 -19.8342 -1.3 -10.5842 -20.2678 -1.3 -9.9354 -21.05975 .6 -10.45675 -19.1739 -3 -9.3827
  [5,24,-19.8342,-1.3,-10.5842,-20.2678,-1.3,-9.9354,-21.05975,.6,-10.45675,-19.1739,-3,-9.3827],
// 5 24 -19.8342 -1.3 -10.5842 -19.1854 -1.3 -11.0178 -19.70675 .6 -11.80975 -18.6327 -3 -9.9239
  [5,24,-19.8342,-1.3,-10.5842,-19.1854,-1.3,-11.0178,-19.70675,.6,-11.80975,-18.6327,-3,-9.9239],
// 5 24 -19.1854 -1.3 -11.0178 -18.42 -1.3 -11.17 -18.75 .6 -12 -18.25 -3 -10
  [5,24,-19.1854,-1.3,-11.0178,-18.42,-1.3,-11.17,-18.75,.6,-12,-18.25,-3,-10],
// 
// 5 24 -22.0217 4 11.1481 -22.25 4 10 -22.75 8 10.5 -21.25 .6 9.5
  [5,24,-22.0217,4,11.1481,-22.25,4,10,-22.75,8,10.5,-21.25,.6,9.5],
// 5 24 -21.3713 4 12.1213 -22.0217 4 11.1481 -22.5217 8 11.6481 -21.05975 .6 10.45675
  [5,24,-21.3713,4,12.1213,-22.0217,4,11.1481,-22.5217,8,11.6481,-21.05975,.6,10.45675],
// 5 24 -21.3713 4 12.1213 -20.3981 4 12.7717 -21.8713 8 12.6213 -20.51775 .6 11.26775
  [5,24,-21.3713,4,12.1213,-20.3981,4,12.7717,-21.8713,8,12.6213,-20.51775,.6,11.26775],
// 5 24 -20.3981 4 12.7717 -19.25 4 13 -19.75 8 13.5 -18.75 .6 12
  [5,24,-20.3981,4,12.7717,-19.25,4,13,-19.75,8,13.5,-18.75,.6,12],
// 5 24 -19.70675 .6 11.80975 -18.75 .6 12 -19.25 4 13 -18.42 -1.3 11.17
  [5,24,-19.70675,.6,11.80975,-18.75,.6,12,-19.25,4,13,-18.42,-1.3,11.17],
// 5 24 -20.51775 .6 11.26775 -19.70675 .6 11.80975 -20.3981 4 12.7717 -19.1854 -1.3 11.0178
  [5,24,-20.51775,.6,11.26775,-19.70675,.6,11.80975,-20.3981,4,12.7717,-19.1854,-1.3,11.0178],
// 5 24 -20.51775 .6 11.26775 -21.05975 .6 10.45675 -22.0217 4 11.1481 -20.2678 -1.3 9.9354
  [5,24,-20.51775,.6,11.26775,-21.05975,.6,10.45675,-22.0217,4,11.1481,-20.2678,-1.3,9.9354],
// 5 24 -21.05975 .6 10.45675 -21.25 .6 9.5 -22.25 4 10 -20.42 -1.3 9.17
  [5,24,-21.05975,.6,10.45675,-21.25,.6,9.5,-22.25,4,10,-20.42,-1.3,9.17],
// 5 24 -20.2678 -1.3 9.9354 -20.42 -1.3 9.17 -21.25 .6 9.5 -19.25 -3 9
  [5,24,-20.2678,-1.3,9.9354,-20.42,-1.3,9.17,-21.25,.6,9.5,-19.25,-3,9],
// 5 24 -19.8342 -1.3 10.5842 -20.2678 -1.3 9.9354 -21.05975 .6 10.45675 -19.1739 -3 9.3827
  [5,24,-19.8342,-1.3,10.5842,-20.2678,-1.3,9.9354,-21.05975,.6,10.45675,-19.1739,-3,9.3827],
// 5 24 -19.8342 -1.3 10.5842 -19.1854 -1.3 11.0178 -19.70675 .6 11.80975 -18.6327 -3 9.9239
  [5,24,-19.8342,-1.3,10.5842,-19.1854,-1.3,11.0178,-19.70675,.6,11.80975,-18.6327,-3,9.9239],
// 5 24 -19.1854 -1.3 11.0178 -18.42 -1.3 11.17 -18.75 .6 12 -18.25 -3 10
  [5,24,-19.1854,-1.3,11.0178,-18.42,-1.3,11.17,-18.75,.6,12,-18.25,-3,10],
// 
// 5 24 22.0217 4 -11.1481 22.25 4 -10 22.75 8 -10.5 21.25 .6 -9.5
  [5,24,22.0217,4,-11.1481,22.25,4,-10,22.75,8,-10.5,21.25,.6,-9.5],
// 5 24 21.3713 4 -12.1213 22.0217 4 -11.1481 22.5217 8 -11.6481 21.05975 .6 -10.45675
  [5,24,21.3713,4,-12.1213,22.0217,4,-11.1481,22.5217,8,-11.6481,21.05975,.6,-10.45675],
// 5 24 21.3713 4 -12.1213 20.3981 4 -12.7717 21.8713 8 -12.6213 20.51775 .6 -11.26775
  [5,24,21.3713,4,-12.1213,20.3981,4,-12.7717,21.8713,8,-12.6213,20.51775,.6,-11.26775],
// 5 24 20.3981 4 -12.7717 19.25 4 -13 19.75 8 -13.5 18.75 .6 -12
  [5,24,20.3981,4,-12.7717,19.25,4,-13,19.75,8,-13.5,18.75,.6,-12],
// 5 24 19.70675 .6 -11.80975 18.75 .6 -12 19.25 4 -13 18.42 -1.3 -11.17
  [5,24,19.70675,.6,-11.80975,18.75,.6,-12,19.25,4,-13,18.42,-1.3,-11.17],
// 5 24 20.51775 .6 -11.26775 19.70675 .6 -11.80975 20.3981 4 -12.7717 19.1854 -1.3 -11.0178
  [5,24,20.51775,.6,-11.26775,19.70675,.6,-11.80975,20.3981,4,-12.7717,19.1854,-1.3,-11.0178],
// 5 24 20.51775 .6 -11.26775 21.05975 .6 -10.45675 22.0217 4 -11.1481 20.2678 -1.3 -9.9354
  [5,24,20.51775,.6,-11.26775,21.05975,.6,-10.45675,22.0217,4,-11.1481,20.2678,-1.3,-9.9354],
// 5 24 21.05975 .6 -10.45675 21.25 .6 -9.5 22.25 4 -10 20.42 -1.3 -9.17
  [5,24,21.05975,.6,-10.45675,21.25,.6,-9.5,22.25,4,-10,20.42,-1.3,-9.17],
// 5 24 20.2678 -1.3 -9.9354 20.42 -1.3 -9.17 21.25 .6 -9.5 19.25 -3 -9
  [5,24,20.2678,-1.3,-9.9354,20.42,-1.3,-9.17,21.25,.6,-9.5,19.25,-3,-9],
// 5 24 19.8342 -1.3 -10.5842 20.2678 -1.3 -9.9354 21.05975 .6 -10.45675 19.1739 -3 -9.3827
  [5,24,19.8342,-1.3,-10.5842,20.2678,-1.3,-9.9354,21.05975,.6,-10.45675,19.1739,-3,-9.3827],
// 5 24 19.8342 -1.3 -10.5842 19.1854 -1.3 -11.0178 19.70675 .6 -11.80975 18.6327 -3 -9.9239
  [5,24,19.8342,-1.3,-10.5842,19.1854,-1.3,-11.0178,19.70675,.6,-11.80975,18.6327,-3,-9.9239],
// 5 24 19.1854 -1.3 -11.0178 18.42 -1.3 -11.17 18.75 .6 -12 18.25 -3 -10
  [5,24,19.1854,-1.3,-11.0178,18.42,-1.3,-11.17,18.75,.6,-12,18.25,-3,-10],
// 
// 5 24 22.0217 4 11.1481 22.25 4 10 22.75 8 10.5 21.25 .6 9.5
  [5,24,22.0217,4,11.1481,22.25,4,10,22.75,8,10.5,21.25,.6,9.5],
// 5 24 21.3713 4 12.1213 22.0217 4 11.1481 22.5217 8 11.6481 21.05975 .6 10.45675
  [5,24,21.3713,4,12.1213,22.0217,4,11.1481,22.5217,8,11.6481,21.05975,.6,10.45675],
// 5 24 21.3713 4 12.1213 20.3981 4 12.7717 21.8713 8 12.6213 20.51775 .6 11.26775
  [5,24,21.3713,4,12.1213,20.3981,4,12.7717,21.8713,8,12.6213,20.51775,.6,11.26775],
// 5 24 20.3981 4 12.7717 19.25 4 13 19.75 8 13.5 18.75 .6 12
  [5,24,20.3981,4,12.7717,19.25,4,13,19.75,8,13.5,18.75,.6,12],
// 5 24 19.70675 .6 11.80975 18.75 .6 12 19.25 4 13 18.42 -1.3 11.17
  [5,24,19.70675,.6,11.80975,18.75,.6,12,19.25,4,13,18.42,-1.3,11.17],
// 5 24 20.51775 .6 11.26775 19.70675 .6 11.80975 20.3981 4 12.7717 19.1854 -1.3 11.0178
  [5,24,20.51775,.6,11.26775,19.70675,.6,11.80975,20.3981,4,12.7717,19.1854,-1.3,11.0178],
// 5 24 20.51775 .6 11.26775 21.05975 .6 10.45675 22.0217 4 11.1481 20.2678 -1.3 9.9354
  [5,24,20.51775,.6,11.26775,21.05975,.6,10.45675,22.0217,4,11.1481,20.2678,-1.3,9.9354],
// 5 24 21.05975 .6 10.45675 21.25 .6 9.5 22.25 4 10 20.42 -1.3 9.17
  [5,24,21.05975,.6,10.45675,21.25,.6,9.5,22.25,4,10,20.42,-1.3,9.17],
// 5 24 20.2678 -1.3 9.9354 20.42 -1.3 9.17 21.25 .6 9.5 19.25 -3 9
  [5,24,20.2678,-1.3,9.9354,20.42,-1.3,9.17,21.25,.6,9.5,19.25,-3,9],
// 5 24 19.8342 -1.3 10.5842 20.2678 -1.3 9.9354 21.05975 .6 10.45675 19.1739 -3 9.3827
  [5,24,19.8342,-1.3,10.5842,20.2678,-1.3,9.9354,21.05975,.6,10.45675,19.1739,-3,9.3827],
// 5 24 19.8342 -1.3 10.5842 19.1854 -1.3 11.0178 19.70675 .6 11.80975 18.6327 -3 9.9239
  [5,24,19.8342,-1.3,10.5842,19.1854,-1.3,11.0178,19.70675,.6,11.80975,18.6327,-3,9.9239],
// 5 24 19.1854 -1.3 11.0178 18.42 -1.3 11.17 18.75 .6 12 18.25 -3 10
  [5,24,19.1854,-1.3,11.0178,18.42,-1.3,11.17,18.75,.6,12,18.25,-3,10],
// 
// 0 // Top
// 2 24 19.25 -3 -9 19.25 -3 9
  [2,24,19.25,-3,-9,19.25,-3,9],
// 2 24 18.25 -3 10 -18.25 -3 10
  [2,24,18.25,-3,10,-18.25,-3,10],
// 2 24 -19.25 -3 9 -19.25 -3 -9
  [2,24,-19.25,-3,9,-19.25,-3,-9],
// 2 24 -18.25 -3 -10 18.25 -3 -10
  [2,24,-18.25,-3,-10,18.25,-3,-10],
// 4 16 -18.25 -3 10 -19.25 -3 9 -16 -3 3.6 -16 -3 6.6
  [4,16,-18.25,-3,10,-19.25,-3,9,-16,-3,3.6,-16,-3,6.6],
// 3 16 -16 -3 6.6 -13 -3 6.6 -18.25 -3 10
  [3,16,-16,-3,6.6,-13,-3,6.6,-18.25,-3,10],
// 3 16 -13 -3 6.6 -7 -3 6.6 -18.25 -3 10
  [3,16,-13,-3,6.6,-7,-3,6.6,-18.25,-3,10],
// 3 16 -18.25 -3 10 -7 -3 6.6 -4 -3 6.6
  [3,16,-18.25,-3,10,-7,-3,6.6,-4,-3,6.6],
// 4 16 -16 -3 -3.6 -19.25 -3 -9 -18.25 -3 -10 -16 -3 -6.6
  [4,16,-16,-3,-3.6,-19.25,-3,-9,-18.25,-3,-10,-16,-3,-6.6],
// 3 16 -13 -3 -6.6 -16 -3 -6.6 -18.25 -3 -10
  [3,16,-13,-3,-6.6,-16,-3,-6.6,-18.25,-3,-10],
// 3 16 -7 -3 -6.6 -13 -3 -6.6 -18.25 -3 -10
  [3,16,-7,-3,-6.6,-13,-3,-6.6,-18.25,-3,-10],
// 3 16 -7 -3 -6.6 -18.25 -3 -10 -4 -3 -6.6
  [3,16,-7,-3,-6.6,-18.25,-3,-10,-4,-3,-6.6],
// 4 16 -19.25 -3 -9 -16 -3 -3.6 -16 -3 3.6 -19.25 -3 9
  [4,16,-19.25,-3,-9,-16,-3,-3.6,-16,-3,3.6,-19.25,-3,9],
// 4 16 16 -3 3.6 19.25 -3 9 18.25 -3 10 16 -3 6.6
  [4,16,16,-3,3.6,19.25,-3,9,18.25,-3,10,16,-3,6.6],
// 3 16 13 -3 6.6 16 -3 6.6 18.25 -3 10
  [3,16,13,-3,6.6,16,-3,6.6,18.25,-3,10],
// 3 16 7 -3 6.6 13 -3 6.6 18.25 -3 10
  [3,16,7,-3,6.6,13,-3,6.6,18.25,-3,10],
// 3 16 7 -3 6.6 18.25 -3 10 4 -3 6.6
  [3,16,7,-3,6.6,18.25,-3,10,4,-3,6.6],
// 4 16 18.25 -3 -10 19.25 -3 -9 16 -3 -3.6 16 -3 -6.6
  [4,16,18.25,-3,-10,19.25,-3,-9,16,-3,-3.6,16,-3,-6.6],
// 3 16 16 -3 -6.6 13 -3 -6.6 18.25 -3 -10
  [3,16,16,-3,-6.6,13,-3,-6.6,18.25,-3,-10],
// 3 16 13 -3 -6.6 7 -3 -6.6 18.25 -3 -10
  [3,16,13,-3,-6.6,7,-3,-6.6,18.25,-3,-10],
// 3 16 18.25 -3 -10 7 -3 -6.6 4 -3 -6.6
  [3,16,18.25,-3,-10,7,-3,-6.6,4,-3,-6.6],
// 4 16 16 -3 3.6 16 -3 -3.6 19.25 -3 -9 19.25 -3 9
  [4,16,16,-3,3.6,16,-3,-3.6,19.25,-3,-9,19.25,-3,9],
// 4 16 18.25 -3 -10 4 -3 -6.6 -4 -3 -6.6 -18.25 -3 -10
  [4,16,18.25,-3,-10,4,-3,-6.6,-4,-3,-6.6,-18.25,-3,-10],
// 4 16 -18.25 -3 10 -4 -3 6.6 4 -3 6.6 18.25 -3 10
  [4,16,-18.25,-3,10,-4,-3,6.6,4,-3,6.6,18.25,-3,10],
];
module ldraw_lib__65753(step=0, col=false, unit=2/5, alt=false, line=0.2, solid=!$preview)
    makepoly(ldraw_lib__65753(solid), step=step, col=col, unit=unit, alt=alt, line=line, solid=solid);
ldraw_lib__65753(line=0.2);
